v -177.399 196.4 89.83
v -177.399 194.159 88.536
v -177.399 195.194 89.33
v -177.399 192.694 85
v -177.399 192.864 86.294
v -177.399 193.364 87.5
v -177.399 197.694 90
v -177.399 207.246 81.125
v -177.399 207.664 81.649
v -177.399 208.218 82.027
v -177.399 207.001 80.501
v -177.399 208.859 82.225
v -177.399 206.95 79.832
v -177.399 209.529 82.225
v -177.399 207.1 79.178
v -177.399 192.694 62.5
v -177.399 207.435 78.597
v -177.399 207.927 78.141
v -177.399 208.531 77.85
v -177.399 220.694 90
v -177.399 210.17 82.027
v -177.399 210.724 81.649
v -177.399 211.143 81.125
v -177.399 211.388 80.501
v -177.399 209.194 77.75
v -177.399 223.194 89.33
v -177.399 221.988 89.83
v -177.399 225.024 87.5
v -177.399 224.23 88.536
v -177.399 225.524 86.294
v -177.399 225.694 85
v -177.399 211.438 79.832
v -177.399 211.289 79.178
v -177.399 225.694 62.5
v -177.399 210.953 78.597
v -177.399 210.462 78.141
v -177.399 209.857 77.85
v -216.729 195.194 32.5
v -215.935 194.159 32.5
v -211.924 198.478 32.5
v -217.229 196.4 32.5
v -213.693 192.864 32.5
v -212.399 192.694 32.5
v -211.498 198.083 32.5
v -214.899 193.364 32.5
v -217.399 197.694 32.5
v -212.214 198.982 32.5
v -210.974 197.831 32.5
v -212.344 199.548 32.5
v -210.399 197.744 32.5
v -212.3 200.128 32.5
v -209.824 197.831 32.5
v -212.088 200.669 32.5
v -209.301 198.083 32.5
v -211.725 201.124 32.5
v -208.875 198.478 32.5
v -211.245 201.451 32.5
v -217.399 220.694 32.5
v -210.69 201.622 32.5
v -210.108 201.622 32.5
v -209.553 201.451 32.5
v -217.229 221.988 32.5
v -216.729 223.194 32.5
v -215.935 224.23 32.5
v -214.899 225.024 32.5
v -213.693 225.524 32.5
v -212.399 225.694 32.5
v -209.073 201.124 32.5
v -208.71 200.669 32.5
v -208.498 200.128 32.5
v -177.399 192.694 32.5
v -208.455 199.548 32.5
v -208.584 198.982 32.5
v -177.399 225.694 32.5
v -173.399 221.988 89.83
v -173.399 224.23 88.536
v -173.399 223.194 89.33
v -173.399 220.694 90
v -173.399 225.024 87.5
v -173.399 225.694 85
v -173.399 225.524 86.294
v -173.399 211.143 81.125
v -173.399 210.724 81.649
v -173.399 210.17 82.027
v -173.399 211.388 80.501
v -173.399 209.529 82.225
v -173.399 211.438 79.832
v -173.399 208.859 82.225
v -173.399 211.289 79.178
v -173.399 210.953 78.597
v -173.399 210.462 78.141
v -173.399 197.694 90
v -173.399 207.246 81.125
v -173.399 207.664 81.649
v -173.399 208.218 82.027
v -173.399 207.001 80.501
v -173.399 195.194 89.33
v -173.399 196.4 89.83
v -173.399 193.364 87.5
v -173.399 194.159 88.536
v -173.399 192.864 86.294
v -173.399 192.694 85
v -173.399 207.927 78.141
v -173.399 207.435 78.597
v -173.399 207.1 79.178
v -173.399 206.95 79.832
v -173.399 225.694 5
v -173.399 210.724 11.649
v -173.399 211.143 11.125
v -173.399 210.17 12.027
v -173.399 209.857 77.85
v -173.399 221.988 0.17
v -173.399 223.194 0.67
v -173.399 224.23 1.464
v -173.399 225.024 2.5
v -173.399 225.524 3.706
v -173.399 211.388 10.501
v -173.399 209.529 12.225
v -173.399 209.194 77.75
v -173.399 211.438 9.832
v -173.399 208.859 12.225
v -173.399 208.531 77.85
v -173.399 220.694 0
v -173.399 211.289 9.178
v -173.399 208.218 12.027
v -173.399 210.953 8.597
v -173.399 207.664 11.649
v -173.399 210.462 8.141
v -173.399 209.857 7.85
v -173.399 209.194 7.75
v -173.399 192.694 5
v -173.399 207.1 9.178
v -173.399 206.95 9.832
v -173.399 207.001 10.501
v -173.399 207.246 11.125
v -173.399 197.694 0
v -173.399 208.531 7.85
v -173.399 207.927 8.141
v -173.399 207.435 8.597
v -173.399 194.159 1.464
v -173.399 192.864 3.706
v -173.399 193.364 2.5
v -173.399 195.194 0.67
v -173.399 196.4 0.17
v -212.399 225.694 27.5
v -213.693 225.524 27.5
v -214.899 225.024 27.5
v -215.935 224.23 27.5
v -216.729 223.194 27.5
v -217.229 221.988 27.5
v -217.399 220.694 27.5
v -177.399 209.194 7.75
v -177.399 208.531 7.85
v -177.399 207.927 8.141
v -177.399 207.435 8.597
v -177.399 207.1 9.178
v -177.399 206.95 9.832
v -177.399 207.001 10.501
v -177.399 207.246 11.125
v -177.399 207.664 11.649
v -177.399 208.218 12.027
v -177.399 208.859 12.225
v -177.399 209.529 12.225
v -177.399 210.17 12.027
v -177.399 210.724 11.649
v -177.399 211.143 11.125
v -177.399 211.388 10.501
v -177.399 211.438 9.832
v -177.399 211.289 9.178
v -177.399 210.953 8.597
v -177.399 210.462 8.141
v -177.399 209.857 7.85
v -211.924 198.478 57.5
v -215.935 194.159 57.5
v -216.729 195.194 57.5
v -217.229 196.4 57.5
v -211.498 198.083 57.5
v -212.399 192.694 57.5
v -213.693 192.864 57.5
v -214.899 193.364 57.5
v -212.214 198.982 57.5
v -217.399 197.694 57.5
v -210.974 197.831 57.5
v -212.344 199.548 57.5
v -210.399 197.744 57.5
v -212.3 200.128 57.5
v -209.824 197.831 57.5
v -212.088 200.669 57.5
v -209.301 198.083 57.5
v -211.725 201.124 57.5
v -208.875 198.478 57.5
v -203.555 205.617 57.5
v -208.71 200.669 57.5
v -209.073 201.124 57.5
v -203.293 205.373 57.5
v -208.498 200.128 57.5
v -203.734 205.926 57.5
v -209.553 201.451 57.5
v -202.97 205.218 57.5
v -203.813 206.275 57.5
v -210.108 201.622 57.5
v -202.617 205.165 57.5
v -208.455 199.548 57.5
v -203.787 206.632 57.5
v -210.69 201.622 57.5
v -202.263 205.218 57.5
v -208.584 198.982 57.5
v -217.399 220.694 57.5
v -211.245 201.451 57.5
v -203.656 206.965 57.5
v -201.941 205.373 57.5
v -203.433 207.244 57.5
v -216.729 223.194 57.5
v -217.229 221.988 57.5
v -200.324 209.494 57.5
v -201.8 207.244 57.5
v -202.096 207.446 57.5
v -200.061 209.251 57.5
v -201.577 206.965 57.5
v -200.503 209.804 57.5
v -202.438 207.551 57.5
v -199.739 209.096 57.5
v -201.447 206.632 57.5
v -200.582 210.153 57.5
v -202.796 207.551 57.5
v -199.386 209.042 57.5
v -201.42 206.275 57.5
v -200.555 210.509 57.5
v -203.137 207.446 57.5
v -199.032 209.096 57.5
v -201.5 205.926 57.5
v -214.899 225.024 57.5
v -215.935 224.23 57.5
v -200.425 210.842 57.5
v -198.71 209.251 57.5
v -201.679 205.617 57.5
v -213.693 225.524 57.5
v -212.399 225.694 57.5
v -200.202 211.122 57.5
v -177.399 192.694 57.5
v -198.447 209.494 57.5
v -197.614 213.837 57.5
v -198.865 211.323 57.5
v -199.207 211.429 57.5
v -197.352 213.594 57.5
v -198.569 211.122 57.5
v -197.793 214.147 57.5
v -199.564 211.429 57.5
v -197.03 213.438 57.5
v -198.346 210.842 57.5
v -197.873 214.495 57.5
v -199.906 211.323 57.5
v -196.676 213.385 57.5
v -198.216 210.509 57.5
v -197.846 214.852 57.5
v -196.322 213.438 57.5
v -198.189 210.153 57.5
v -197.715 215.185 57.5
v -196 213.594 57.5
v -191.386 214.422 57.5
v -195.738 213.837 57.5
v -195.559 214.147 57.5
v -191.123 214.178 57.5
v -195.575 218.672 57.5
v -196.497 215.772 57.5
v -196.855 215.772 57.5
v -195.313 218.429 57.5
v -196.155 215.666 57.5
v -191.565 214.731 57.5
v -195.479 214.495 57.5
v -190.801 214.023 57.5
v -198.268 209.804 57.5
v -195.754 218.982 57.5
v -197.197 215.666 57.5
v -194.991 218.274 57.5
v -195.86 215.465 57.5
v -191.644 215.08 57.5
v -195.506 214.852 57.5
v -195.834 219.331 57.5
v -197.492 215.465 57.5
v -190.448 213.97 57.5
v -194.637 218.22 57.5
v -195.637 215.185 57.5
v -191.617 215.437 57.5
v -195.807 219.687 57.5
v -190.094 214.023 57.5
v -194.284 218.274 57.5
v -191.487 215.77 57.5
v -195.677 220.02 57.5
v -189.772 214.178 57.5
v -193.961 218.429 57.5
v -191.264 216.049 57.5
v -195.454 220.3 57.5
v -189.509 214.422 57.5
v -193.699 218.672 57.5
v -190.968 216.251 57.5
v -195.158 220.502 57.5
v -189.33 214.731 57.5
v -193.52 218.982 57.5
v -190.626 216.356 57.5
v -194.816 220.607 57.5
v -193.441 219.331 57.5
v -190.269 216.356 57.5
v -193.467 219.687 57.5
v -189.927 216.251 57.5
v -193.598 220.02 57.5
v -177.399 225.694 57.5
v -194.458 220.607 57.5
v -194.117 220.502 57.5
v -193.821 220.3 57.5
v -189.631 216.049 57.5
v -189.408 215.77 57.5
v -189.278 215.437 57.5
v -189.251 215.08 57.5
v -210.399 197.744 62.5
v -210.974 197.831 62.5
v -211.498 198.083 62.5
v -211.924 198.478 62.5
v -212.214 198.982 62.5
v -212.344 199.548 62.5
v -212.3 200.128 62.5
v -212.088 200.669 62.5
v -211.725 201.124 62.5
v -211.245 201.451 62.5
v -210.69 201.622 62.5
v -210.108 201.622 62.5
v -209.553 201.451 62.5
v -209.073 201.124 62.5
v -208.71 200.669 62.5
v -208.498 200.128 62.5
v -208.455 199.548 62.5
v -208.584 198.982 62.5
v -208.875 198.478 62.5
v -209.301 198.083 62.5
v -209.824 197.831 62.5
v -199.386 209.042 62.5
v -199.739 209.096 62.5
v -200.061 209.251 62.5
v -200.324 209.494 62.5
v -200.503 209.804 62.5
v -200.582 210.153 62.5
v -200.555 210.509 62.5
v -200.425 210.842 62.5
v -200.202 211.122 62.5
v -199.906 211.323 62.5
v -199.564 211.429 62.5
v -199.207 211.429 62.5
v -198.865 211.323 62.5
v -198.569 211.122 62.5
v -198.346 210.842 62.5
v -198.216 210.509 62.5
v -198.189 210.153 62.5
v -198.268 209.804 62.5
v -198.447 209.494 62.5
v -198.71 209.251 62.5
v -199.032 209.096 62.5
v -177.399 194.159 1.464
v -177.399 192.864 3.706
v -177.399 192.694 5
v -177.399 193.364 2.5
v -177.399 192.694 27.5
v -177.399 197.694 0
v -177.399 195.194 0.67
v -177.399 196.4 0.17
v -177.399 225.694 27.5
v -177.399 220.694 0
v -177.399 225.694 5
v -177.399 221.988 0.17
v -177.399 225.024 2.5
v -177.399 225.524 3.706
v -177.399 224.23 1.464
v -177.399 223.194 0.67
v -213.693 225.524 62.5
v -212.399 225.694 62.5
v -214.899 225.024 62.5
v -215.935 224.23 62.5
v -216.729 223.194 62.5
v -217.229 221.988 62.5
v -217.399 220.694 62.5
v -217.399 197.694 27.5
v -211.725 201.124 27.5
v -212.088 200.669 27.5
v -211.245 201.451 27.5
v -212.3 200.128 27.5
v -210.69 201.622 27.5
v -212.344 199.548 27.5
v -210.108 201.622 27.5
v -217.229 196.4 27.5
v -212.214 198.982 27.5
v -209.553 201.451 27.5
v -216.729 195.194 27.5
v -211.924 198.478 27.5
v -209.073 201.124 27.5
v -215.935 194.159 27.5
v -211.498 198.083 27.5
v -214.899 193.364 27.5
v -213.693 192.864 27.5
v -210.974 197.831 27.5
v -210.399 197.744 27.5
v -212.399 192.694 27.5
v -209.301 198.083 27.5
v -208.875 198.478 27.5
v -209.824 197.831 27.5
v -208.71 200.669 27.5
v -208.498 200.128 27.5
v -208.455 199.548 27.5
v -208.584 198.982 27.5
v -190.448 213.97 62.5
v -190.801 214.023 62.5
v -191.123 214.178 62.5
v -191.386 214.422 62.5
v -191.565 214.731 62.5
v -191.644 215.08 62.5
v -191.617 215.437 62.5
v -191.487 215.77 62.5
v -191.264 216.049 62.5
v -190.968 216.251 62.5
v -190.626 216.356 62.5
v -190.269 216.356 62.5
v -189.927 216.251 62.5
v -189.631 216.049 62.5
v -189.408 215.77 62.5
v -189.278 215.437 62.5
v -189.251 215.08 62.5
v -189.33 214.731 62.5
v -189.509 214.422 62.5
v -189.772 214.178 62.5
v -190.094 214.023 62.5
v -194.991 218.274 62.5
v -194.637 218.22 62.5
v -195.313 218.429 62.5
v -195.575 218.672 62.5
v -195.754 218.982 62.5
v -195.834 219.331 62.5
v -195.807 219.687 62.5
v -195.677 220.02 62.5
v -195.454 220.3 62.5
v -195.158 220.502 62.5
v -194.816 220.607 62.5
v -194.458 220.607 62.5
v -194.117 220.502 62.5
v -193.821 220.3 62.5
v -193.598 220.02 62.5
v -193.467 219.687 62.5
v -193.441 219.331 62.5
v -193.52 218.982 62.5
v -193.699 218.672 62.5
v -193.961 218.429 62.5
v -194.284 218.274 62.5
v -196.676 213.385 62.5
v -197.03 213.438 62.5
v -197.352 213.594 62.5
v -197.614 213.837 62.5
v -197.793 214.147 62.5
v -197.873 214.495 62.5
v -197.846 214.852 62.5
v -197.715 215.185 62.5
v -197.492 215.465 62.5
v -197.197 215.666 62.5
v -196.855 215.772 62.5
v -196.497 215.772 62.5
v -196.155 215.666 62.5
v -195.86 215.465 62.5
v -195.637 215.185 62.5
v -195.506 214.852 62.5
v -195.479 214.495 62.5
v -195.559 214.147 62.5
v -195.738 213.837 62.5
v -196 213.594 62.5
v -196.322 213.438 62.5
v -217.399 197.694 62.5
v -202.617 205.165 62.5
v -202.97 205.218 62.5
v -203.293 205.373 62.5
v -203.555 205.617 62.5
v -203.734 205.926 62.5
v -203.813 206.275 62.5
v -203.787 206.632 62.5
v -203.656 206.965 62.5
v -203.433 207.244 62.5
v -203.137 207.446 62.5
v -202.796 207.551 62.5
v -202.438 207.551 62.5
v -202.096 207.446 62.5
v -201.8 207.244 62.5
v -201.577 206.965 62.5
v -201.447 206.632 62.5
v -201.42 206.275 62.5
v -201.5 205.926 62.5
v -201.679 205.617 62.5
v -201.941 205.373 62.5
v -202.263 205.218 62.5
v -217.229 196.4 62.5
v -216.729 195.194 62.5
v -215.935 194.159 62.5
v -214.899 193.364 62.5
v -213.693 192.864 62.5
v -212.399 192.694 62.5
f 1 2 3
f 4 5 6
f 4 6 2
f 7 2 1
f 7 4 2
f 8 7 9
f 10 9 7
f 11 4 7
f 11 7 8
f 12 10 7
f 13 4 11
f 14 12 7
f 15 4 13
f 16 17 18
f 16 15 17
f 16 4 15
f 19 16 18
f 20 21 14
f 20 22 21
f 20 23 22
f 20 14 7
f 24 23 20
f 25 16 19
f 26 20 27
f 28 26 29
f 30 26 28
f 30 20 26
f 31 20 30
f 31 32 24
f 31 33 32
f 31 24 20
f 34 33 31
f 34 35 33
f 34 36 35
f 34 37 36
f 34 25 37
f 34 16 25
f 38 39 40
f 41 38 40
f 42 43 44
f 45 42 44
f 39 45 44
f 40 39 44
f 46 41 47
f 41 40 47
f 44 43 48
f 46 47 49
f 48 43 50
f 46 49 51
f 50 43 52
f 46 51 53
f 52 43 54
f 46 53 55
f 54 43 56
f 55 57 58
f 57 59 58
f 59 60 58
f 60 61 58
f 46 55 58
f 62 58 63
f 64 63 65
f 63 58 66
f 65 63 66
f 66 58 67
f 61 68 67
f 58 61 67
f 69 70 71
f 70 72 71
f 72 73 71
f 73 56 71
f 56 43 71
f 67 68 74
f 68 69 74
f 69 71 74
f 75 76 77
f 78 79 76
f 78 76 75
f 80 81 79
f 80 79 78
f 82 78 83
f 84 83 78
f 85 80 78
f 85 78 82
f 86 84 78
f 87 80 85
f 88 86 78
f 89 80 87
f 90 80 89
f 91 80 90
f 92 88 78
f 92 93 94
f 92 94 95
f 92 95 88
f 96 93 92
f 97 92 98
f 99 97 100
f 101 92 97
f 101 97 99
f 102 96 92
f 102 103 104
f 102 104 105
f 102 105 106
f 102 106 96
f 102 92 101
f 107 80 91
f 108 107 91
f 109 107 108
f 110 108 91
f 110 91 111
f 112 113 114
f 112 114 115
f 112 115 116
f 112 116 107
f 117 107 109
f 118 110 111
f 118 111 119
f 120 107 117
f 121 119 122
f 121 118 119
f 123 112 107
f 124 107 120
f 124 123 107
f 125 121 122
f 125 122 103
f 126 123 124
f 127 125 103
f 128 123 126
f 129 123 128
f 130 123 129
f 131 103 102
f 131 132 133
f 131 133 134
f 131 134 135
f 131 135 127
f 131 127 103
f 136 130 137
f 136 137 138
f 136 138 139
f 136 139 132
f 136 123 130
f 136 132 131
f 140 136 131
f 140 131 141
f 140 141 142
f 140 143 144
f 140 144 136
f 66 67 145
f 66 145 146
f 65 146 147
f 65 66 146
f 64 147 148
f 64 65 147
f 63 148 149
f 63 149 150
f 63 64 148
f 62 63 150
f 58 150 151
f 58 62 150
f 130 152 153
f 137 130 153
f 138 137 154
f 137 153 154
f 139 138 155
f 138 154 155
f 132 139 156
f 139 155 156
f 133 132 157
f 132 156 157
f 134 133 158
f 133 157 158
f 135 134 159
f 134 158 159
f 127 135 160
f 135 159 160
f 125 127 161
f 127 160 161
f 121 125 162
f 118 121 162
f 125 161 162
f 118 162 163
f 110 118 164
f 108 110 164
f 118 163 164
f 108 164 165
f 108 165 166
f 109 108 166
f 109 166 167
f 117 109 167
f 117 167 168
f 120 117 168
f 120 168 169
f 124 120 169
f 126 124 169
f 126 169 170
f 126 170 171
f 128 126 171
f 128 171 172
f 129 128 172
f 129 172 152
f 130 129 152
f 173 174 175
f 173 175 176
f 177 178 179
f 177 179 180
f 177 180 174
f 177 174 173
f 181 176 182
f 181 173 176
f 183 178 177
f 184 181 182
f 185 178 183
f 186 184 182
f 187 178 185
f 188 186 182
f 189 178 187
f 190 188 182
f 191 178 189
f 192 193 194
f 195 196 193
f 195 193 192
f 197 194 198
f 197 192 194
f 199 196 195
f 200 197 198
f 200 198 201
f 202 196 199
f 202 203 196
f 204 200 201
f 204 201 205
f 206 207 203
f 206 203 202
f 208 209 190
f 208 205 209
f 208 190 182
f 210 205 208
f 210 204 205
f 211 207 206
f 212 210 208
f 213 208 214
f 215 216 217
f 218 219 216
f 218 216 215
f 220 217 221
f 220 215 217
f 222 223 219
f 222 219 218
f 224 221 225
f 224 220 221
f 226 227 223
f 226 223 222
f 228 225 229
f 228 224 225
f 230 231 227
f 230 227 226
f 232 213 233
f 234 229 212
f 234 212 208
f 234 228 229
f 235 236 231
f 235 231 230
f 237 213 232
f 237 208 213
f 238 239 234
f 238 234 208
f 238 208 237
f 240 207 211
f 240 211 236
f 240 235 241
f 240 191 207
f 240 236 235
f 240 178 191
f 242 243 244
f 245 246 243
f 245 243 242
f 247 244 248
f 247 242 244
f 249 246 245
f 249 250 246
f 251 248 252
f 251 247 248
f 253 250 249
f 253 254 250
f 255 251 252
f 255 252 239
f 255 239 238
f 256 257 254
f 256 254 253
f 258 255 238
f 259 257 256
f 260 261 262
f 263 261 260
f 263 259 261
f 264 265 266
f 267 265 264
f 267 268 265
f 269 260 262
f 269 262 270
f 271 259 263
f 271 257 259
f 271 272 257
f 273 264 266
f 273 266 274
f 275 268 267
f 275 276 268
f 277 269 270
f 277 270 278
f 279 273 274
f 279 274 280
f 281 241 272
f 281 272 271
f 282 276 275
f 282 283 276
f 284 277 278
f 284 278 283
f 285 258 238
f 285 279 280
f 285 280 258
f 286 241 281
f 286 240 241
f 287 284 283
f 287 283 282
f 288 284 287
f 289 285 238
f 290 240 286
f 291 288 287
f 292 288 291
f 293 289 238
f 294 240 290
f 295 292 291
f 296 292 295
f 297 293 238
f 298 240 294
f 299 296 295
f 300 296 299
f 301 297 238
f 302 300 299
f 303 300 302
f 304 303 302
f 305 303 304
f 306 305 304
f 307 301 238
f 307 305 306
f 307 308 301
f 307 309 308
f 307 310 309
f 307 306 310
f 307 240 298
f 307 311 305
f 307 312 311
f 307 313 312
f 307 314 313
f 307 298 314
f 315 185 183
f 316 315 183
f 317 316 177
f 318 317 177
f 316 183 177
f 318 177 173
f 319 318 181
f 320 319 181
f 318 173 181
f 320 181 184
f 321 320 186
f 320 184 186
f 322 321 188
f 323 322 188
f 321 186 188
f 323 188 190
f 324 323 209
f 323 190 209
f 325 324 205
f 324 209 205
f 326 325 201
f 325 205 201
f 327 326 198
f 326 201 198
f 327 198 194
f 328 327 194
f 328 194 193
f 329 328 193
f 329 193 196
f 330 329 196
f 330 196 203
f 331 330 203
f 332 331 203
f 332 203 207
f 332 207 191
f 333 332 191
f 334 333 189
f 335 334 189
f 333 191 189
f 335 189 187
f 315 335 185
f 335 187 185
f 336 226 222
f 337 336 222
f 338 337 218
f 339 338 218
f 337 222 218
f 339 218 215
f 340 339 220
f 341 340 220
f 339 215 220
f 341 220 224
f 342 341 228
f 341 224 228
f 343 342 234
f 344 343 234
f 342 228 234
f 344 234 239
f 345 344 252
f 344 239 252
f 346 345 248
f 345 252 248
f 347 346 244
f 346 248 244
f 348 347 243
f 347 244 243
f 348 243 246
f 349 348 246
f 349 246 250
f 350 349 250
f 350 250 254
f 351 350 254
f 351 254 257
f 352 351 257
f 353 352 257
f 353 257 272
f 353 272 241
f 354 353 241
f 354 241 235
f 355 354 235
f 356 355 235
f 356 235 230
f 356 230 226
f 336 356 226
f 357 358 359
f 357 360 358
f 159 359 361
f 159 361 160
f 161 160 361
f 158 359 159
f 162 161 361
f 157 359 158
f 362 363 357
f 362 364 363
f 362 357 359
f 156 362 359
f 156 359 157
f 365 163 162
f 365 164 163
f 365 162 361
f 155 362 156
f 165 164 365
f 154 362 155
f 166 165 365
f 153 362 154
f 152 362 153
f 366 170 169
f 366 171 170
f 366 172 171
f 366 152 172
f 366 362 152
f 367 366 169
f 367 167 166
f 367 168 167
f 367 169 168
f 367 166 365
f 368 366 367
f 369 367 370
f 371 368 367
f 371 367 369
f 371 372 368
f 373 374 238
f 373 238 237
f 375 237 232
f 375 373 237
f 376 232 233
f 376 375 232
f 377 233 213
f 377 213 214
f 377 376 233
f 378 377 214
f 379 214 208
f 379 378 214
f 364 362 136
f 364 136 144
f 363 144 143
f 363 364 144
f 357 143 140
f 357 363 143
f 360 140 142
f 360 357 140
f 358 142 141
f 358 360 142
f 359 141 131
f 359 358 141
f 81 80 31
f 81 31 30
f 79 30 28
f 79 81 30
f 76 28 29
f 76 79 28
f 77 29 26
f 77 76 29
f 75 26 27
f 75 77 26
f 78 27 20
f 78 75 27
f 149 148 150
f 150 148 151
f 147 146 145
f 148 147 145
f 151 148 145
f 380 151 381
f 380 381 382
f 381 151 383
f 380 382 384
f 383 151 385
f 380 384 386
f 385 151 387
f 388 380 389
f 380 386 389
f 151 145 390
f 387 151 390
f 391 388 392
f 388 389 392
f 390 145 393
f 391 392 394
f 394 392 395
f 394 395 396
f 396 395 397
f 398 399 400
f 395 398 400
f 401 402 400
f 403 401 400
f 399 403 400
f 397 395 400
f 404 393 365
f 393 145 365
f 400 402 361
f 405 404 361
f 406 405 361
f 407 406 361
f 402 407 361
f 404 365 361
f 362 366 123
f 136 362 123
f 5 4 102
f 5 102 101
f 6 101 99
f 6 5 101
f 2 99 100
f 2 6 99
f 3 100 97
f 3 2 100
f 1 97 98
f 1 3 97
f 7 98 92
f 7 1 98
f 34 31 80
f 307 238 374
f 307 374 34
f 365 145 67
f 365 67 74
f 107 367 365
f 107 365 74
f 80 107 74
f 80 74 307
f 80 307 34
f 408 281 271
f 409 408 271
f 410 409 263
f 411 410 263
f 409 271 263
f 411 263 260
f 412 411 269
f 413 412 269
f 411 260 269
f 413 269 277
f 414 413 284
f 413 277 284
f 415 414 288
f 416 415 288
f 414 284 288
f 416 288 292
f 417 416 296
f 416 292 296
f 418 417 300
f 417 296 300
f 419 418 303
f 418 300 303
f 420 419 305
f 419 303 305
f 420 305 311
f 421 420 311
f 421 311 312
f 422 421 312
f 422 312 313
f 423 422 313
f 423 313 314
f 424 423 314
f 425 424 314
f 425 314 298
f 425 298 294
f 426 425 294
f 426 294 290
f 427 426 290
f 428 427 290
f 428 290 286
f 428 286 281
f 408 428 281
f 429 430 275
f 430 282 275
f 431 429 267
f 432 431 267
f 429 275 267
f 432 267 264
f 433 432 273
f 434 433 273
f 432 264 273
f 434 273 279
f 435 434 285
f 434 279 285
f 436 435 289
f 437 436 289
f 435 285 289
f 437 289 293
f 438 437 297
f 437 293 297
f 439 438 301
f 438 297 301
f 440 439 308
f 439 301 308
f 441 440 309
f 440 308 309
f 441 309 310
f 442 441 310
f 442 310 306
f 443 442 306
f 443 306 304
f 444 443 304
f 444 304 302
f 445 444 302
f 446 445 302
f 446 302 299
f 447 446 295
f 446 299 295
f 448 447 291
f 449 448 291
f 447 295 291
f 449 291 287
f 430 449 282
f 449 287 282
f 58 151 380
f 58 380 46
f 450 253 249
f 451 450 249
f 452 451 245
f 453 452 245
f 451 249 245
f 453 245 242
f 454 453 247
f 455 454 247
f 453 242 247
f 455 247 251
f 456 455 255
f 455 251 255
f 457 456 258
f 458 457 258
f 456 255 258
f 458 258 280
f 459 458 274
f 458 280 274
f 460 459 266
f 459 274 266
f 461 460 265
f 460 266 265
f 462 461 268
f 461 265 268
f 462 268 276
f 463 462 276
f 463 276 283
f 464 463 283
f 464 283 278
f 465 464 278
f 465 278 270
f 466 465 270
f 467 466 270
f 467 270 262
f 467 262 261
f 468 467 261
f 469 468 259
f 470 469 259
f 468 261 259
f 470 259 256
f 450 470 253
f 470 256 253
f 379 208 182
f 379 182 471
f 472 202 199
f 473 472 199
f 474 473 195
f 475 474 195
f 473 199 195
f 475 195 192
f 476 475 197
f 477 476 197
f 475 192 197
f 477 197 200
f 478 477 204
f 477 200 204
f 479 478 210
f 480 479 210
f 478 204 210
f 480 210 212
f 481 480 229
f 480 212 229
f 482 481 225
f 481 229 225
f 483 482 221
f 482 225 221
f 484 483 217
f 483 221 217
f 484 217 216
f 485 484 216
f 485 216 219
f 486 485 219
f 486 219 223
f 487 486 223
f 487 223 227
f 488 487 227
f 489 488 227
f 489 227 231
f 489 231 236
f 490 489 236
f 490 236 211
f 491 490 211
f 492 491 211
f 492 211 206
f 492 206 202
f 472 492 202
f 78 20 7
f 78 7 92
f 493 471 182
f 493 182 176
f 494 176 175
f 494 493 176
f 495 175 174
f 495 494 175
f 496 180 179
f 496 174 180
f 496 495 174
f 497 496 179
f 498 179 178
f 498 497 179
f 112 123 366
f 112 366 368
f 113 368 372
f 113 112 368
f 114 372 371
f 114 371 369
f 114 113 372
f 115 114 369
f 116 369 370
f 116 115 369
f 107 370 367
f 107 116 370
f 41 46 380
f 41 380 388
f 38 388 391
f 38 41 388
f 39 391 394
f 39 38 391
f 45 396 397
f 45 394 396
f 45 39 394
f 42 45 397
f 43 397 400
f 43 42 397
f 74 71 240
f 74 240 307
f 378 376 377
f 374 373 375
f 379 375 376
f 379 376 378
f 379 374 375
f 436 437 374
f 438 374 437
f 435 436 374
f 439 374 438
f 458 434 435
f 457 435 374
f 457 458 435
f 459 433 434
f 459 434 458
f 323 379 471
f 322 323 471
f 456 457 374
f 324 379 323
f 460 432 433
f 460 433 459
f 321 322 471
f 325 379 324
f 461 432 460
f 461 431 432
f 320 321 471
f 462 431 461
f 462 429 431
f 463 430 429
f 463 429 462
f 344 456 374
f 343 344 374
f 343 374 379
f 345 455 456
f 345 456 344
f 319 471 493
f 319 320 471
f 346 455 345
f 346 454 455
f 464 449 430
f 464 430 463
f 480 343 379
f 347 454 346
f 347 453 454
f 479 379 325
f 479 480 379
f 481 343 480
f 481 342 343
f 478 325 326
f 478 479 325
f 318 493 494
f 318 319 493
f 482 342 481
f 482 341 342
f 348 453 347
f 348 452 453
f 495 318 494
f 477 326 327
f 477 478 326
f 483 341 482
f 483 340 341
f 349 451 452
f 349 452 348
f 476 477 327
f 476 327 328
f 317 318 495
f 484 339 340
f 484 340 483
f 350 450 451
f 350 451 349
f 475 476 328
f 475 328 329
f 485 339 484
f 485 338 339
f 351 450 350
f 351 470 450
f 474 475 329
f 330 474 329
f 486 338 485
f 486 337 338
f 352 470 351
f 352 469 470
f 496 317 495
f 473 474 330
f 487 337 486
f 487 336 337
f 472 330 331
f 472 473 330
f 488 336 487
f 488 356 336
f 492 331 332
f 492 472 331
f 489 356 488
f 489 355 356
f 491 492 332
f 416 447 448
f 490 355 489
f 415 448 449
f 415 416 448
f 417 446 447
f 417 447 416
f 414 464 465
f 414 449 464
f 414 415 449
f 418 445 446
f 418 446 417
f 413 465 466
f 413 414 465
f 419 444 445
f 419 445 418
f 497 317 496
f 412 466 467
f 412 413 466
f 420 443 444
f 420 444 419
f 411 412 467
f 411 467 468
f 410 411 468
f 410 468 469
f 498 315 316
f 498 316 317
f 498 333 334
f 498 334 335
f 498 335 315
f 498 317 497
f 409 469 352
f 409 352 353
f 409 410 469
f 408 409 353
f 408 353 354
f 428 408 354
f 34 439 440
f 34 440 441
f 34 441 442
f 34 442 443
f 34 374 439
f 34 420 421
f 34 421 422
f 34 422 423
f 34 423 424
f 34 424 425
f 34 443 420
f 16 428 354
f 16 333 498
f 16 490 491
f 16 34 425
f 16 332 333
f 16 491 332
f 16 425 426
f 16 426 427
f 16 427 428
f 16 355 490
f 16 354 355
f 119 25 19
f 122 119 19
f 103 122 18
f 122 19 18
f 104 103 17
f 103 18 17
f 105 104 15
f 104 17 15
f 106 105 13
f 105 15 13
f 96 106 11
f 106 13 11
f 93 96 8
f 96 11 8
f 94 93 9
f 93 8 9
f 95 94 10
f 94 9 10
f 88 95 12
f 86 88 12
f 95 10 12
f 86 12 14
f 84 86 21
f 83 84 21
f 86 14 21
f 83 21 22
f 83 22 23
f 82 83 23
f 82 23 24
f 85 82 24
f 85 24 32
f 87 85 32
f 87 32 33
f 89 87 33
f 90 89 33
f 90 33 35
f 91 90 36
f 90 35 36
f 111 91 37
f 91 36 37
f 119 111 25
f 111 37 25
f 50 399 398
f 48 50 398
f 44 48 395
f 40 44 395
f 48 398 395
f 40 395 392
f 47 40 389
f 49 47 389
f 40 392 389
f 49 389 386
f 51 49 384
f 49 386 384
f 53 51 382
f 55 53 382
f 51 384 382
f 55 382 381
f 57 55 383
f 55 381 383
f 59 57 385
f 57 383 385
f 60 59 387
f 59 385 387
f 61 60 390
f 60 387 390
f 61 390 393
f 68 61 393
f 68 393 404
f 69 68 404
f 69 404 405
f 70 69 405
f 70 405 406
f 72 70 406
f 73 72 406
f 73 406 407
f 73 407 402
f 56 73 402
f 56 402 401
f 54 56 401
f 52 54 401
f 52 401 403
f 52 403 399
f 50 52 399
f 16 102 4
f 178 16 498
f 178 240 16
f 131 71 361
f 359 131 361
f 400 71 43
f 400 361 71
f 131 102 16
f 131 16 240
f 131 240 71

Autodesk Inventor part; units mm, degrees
ref_plane "YZ Plane" through (0, 0, 0) normal (1, 0, 0) x (0, 1, 0)
ref_plane "XZ Plane" through (0, 0, 0) normal (0, 1, 0) x (-1, 0, 0)
ref_plane "XY Plane" through (0, 0, 0) normal (0, 0, 1) x (1, 0, 0)
sketch "Szkic1" plane through (0, 0, 0) normal (0, 0, 1) x (1, 0, 0)
  circle A0 centre (0, 0) radius 55 construction
  circle A1 centre (137.9996, 0.347) radius 55 construction
  circle A2 centre (275.9991, 0.6941) radius 55 construction
  line L0 (-173.3991, 195.8773) -> (-173.4121, 201.0636) construction
  line L1 (-173.3991, 247) -> (-173.3991, -116) construction
  line L2 (275.9991, -54.3059) -> (-673, -54.3059) construction
  line L3 (-488.3991, -4.3059) -> (-438.3991, -4.3059) construction
  line L4 (-438.3991, -4.3059) -> (-438.3991, -54.3059) construction
  line L5 (-438.3991, -54.3059) -> (-488.3991, -54.3059) construction
  line L6 (-488.3991, -54.3059) -> (-488.3991, -4.3059) construction
  line L7 (-438.4326, 222.6941) -> (233, 222.6941) construction
  line L8 (-438.4326, 192.6941) -> (378, 192.6941) construction
  line L9 (-476, 207.6941) -> (256, 207.6941) construction
  line L10 (-173.3991, 192.6941) -> (-177.3991, 192.6941)
  line L11 (-177.3991, 192.6941) -> (-177.3991, 225.6941)
  line L12 (-177.3991, 225.6941) -> (-173.3991, 225.6941)
  line L13 (-173.3991, 225.6941) -> (-173.3991, 192.6941)
  point P0 (15, -3)
  dimension "d0" = 50
  dimension "d1" = 50
  dimension "d2" = 265
  dimension "d3" = 277
  dimension "d4" = 30
  dimension "d5" = 15
  dimension "d6" = 4
  dimension "d62" = 33
extrude "Wyciągnięcie proste1" add sketch "Szkic1" along normal blind 90
sketch "Szkic2" plane through (-177.3991, 192.6941, 0) normal (-1, 0, 0) x (0, 0, 1)
  line L0 (90, 0) -> (90, 33) projected
  line L1 (0, 0) -> (0, 33) projected
  line L2 (0, 0) -> (0, 33) projected
  line L3 (0, 0) -> (90, 0) projected
  line L4 (90, 33) -> (90, 0) projected
  line L5 (0, 33) -> (90, 33) projected
  line L6 (0, 33) -> (90, 33) projected
  line L7 (0, 0) -> (90, 0) projected
  line L8 (57.5, 33) -> (62.5, 33)
  line L9 (62.5, 33) -> (62.5, 0)
  line L10 (62.5, 0) -> (57.5, 0)
  line L11 (57.5, 0) -> (57.5, 33)
  line L12 (32.5, 33) -> (27.5, 33)
  line L13 (27.5, 33) -> (27.5, 0)
  line L14 (27.5, 0) -> (32.5, 0)
  line L15 (32.5, 0) -> (32.5, 33)
  point P0 (0, -192.6941)
  point P1 (80, 16)
  point P2 (10, 16)
  dimension "d9" = 10
  dimension "d10" = 10
  dimension "d11" = 5
  dimension "d12" = 5
  dimension "d13" = 17.5
  dimension "d14" = 17.5
extrude "Wyciągnięcie proste2" add sketch "Szkic2" along normal blind 40 contours L3 L11 L5 L9 | L3 L13 L5 L15
fillet "Zaokrąglenie1" radius 5 8 edges at (-217.3991, 192.6941, 60) (-217.3991, 225.6941, 60) (-217.3991, 225.6941, 30) (-217.3991, 192.6941, 30) (-175.3991, 192.6941, 90) (-175.3991, 225.6941, 90) (-175.3991, 225.6941, 0) (-175.3991, 192.6941, 0)
sketch "Szkic3" plane through (-177.3991, 192.6941, 62.5) normal (0, 0, 1) x (1, 0, 0)
  line L0 (-298.6009, 15) -> (433.3991, 15) construction
  line L1 (-40, 5) -> (-40, 28) projected
  line L2 (-311, -197) -> (-261, -197) construction
  line L3 (-261, -247) -> (-311, -247) construction
  line L4 (-497, -197) -> (104, -197) construction
  line L5 (-221, 86) -> (-221, -341.1695) construction
  line L6 (-246, 90.4419) -> (-246, -336.7276) construction
  line L7 (-296, 88) -> (-296, -339.1695) construction
  line L8 (-271, 89) -> (-271, -338.1695) construction
  line L9 (4, 54.3059) -> (4, -308.6941) construction
  line L10 (-221, -197) -> (144.5683, 199.6805) construction
  line L11 (-246, -197) -> (156.8943, 188.8706) construction
  line L12 (-271, -197) -> (64.3345, 90.4296) construction
  line L13 (-296, -197) -> (182.0787, 173.8291) construction
  line L14 (-196, -338.1695) -> (-196, 81) construction
  line L15 (-171, -340.9749) -> (-171, 78.1946) construction
  line L16 (-296, -333) -> (-296, 85.2632) construction
  line L17 (-321, 80.9017) -> (-321, -346.2678) construction
  line L18 (-196, -197) -> (27.7781, 83.0658) construction
  circle A0 centre (-33, 7) radius 26.5 construction
  circle A1 centre (-33, 7) radius 24 construction
  circle A2 centre (-33, 7) radius 19 construction
  circle A3 centre (-33, 7) radius 25.25 construction
  circle A4 centre (-33, 7) radius 21.5 construction
  circle A5 centre (-33, 7) radius 20.25 construction
  circle A6 centre (-33, 7) radius 31.5 construction
  circle A7 centre (-33, 7) radius 16.5 construction
  circle A8 centre (-33, 7) radius 15.25 construction
  circle A9 centre (-33, 7) radius 14 construction
  circle A10 centre (-33, 7) radius 11.5 construction
  circle A11 centre (-33, 7) radius 10.25 construction
  circle A12 centre (-33, 7) radius 9 construction
  point P0 (177.3991, -192.6941)
  point P1 (-33, 15)
  point P2 (-13.0484, 22.4757)
  point P3 (-21.9865, 17.5482)
  point P4 (-25.2176, 13.6706)
  point P5 (-19.277, 21.891)
  point P6 (-17.2382, 26.7264)
  dimension "d33" = 40.5
  dimension "d36" = 30.5
  dimension "d46" = 20.5
  dimension "d18" = 7
  dimension "d19" = 8
  dimension "d20" = 225
  dimension "d21" = 250
  dimension "d22" = 275
  dimension "d24" = 200
  dimension "d25" = 175
  dimension "d26" = 300
  dimension "d27" = 325
  dimension "d28" = 53
  dimension "d29" = 48
  dimension "d30" = 38
  dimension "d31" = 50.5
  dimension "d32" = 43
  dimension "d34" = 63
  dimension "d35" = 33
  dimension "d37" = 28
  dimension "d45" = 23
  dimension "d47" = 18
hole "Otwór2" at (-190.4475, 215.1698, 62.5) at (-199.3855, 210.2423, 62.5) at (-202.6167, 206.3647, 62.5) at (-196.676, 214.585, 62.5) at (-194.6373, 219.4204, 62.5) direction (0, 0, -1) diameter 2.4 depth 8 tip angle 118 clearance for "Śruba ze łbem płaskim obrobiona" size "M2" standard "ANSI Profil metryczny M"
hole "Otwór3" at (-210.3991, 199.6941, 62.5) direction (0, 0, -1) diameter 3.9 end through all clearance for "Śruba ze łbem płaskim obrobiona" size "M3.5" standard "ANSI Profil metryczny M"
sketch "Szkic4" plane through (-173.3991, 197.6941, 0) normal (1, 0, 0) x (0, 0, -1)
  line L0 (-90, 23) -> (-90, 0) projected
  line L1 (-5, 28) -> (-85, 28) projected
  point P0 (0, -197.6941)
  point P1 (-80, 11.5)
  point P2 (-10, 11.5)
  dimension "d63" = 70
  dimension "d64" = 10
  dimension "d65" = 16.5
hole "Otwór4" at (-173.3991, 209.1941, 80) at (-173.3991, 209.1941, 10) direction (-1, 0, 0) diameter 4.5 depth 8 tip angle 118 clearance for "Śruba ze łbem płaskim obrobiona" size "M4" standard "ANSI Profil metryczny M"
equation "\"d5\" = 0.5 * d4"
equation "\"d9\" = d10"
equation "\"d14\" = d13"
properties part number "Czesc_do_Ramy"
